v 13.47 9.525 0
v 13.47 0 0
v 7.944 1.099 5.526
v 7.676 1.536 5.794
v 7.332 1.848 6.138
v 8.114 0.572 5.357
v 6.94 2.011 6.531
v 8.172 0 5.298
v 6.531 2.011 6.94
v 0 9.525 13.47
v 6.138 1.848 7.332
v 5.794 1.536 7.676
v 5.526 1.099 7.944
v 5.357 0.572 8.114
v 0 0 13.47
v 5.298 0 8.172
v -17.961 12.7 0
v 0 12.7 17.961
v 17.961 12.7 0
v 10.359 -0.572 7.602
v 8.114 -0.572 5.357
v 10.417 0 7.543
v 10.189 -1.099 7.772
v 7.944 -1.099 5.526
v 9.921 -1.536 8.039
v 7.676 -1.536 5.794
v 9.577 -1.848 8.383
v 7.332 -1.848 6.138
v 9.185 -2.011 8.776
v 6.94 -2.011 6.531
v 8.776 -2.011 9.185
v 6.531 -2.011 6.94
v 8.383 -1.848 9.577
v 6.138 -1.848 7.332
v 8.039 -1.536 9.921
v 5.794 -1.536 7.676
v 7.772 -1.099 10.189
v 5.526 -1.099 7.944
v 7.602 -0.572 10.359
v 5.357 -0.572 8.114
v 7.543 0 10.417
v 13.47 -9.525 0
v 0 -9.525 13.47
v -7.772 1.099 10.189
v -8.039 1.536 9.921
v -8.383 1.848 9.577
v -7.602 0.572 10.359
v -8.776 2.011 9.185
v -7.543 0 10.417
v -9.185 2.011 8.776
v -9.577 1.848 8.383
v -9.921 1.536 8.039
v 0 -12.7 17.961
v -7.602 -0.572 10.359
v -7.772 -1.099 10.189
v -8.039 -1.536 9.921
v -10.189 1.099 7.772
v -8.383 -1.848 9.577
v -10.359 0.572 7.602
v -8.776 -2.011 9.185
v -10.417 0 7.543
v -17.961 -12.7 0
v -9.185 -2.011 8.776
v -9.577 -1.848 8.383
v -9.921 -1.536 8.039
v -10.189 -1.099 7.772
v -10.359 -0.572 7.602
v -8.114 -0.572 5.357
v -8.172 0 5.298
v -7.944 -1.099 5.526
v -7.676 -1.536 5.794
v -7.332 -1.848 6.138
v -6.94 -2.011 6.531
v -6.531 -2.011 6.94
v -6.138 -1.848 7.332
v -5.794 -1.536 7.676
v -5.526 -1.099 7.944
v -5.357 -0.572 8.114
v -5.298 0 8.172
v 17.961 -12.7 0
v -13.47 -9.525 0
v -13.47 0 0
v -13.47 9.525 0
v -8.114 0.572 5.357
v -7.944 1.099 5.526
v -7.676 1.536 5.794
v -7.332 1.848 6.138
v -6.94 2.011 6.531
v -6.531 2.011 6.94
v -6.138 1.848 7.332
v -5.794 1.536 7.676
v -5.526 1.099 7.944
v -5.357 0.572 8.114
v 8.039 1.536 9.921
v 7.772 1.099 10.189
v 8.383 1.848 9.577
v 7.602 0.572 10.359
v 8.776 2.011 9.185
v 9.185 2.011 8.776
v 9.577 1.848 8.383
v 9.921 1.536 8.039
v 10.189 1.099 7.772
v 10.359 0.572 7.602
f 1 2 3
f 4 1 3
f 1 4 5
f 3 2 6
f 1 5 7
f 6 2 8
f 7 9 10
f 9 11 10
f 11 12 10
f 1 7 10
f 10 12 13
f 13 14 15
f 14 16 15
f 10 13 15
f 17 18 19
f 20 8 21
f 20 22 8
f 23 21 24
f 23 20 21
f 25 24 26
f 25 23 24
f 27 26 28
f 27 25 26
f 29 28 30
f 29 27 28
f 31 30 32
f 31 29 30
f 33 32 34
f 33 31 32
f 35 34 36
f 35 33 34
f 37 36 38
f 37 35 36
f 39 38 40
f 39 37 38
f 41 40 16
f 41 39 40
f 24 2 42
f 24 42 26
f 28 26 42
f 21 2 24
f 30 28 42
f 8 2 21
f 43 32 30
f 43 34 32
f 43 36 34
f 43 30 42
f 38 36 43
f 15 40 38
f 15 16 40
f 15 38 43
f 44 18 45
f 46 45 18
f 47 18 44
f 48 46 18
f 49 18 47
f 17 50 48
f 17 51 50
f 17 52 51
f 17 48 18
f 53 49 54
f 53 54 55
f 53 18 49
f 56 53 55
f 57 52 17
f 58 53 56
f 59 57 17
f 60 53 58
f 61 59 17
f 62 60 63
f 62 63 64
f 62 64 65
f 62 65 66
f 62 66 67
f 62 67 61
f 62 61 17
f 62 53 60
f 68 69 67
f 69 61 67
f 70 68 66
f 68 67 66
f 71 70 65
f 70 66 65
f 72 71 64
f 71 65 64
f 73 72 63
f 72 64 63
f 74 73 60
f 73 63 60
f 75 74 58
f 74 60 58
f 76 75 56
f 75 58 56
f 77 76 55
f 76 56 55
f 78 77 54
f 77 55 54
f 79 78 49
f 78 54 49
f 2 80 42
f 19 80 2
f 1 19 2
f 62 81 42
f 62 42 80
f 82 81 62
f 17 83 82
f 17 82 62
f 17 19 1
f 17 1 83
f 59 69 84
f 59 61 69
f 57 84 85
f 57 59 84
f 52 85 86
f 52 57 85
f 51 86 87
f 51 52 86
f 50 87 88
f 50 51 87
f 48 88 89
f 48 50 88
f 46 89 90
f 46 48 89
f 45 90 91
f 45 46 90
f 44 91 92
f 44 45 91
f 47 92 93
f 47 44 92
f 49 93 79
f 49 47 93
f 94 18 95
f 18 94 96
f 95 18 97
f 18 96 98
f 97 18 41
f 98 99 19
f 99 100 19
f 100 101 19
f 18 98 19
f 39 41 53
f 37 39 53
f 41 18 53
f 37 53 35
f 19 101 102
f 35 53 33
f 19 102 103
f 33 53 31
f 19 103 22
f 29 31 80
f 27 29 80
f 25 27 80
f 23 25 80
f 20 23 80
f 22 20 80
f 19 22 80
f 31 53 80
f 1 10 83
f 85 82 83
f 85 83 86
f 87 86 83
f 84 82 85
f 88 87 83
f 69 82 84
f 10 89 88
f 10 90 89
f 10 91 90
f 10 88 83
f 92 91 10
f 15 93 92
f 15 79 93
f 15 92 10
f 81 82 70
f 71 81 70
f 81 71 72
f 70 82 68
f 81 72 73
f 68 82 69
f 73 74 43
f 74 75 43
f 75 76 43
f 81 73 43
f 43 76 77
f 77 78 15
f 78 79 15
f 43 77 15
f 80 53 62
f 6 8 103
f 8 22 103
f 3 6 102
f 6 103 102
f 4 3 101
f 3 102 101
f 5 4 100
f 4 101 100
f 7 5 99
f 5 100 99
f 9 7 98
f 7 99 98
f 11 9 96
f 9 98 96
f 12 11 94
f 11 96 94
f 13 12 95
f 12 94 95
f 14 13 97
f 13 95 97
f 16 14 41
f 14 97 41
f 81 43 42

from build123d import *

# Parameters (mm, degrees)
F1_DEPTH = 12.7
F3_DEPTH = 3.175
F4_R     = 2.032
F5_DEPTH = 12.701


with BuildPart() as f1:
    # F0 (on Front) → F1 (new body)
    with BuildSketch(Plane.XZ):
        Polygon((0, 13.4703841816), (0, 17.9605122421), (-17.9605122421, 0), (-13.4703841816, 0), align=None)
    extrude(amount=F1_DEPTH)

    # F2 (on face) → F3 (join)
    with BuildSketch(Plane.XZ.offset(12.7)):
        Polygon((0, 0), (0, 13.4703841816), (-13.4703841816, 0), align=None)
    extrude(amount=-F3_DEPTH)

    # F4 (on face) → F5 (cut, through all)
    with BuildSketch(Plane(origin=(-8.9802561211, 0, 8.9802561211), x_dir=(0, -1, 0), z_dir=(-0.7071067812, 0, 0.7071067812))):
        Circle(F4_R)
    extrude(amount=-F5_DEPTH, mode=Mode.SUBTRACT)

    # F6: F1 across face


with BuildPart() as f1_1:
    add(f1.part)
    add(f1.part.mirror(Plane(origin=(0, -8.3910714286, 11.8667670171), x_dir=(0, 1, 0), z_dir=(1, 0, 0))))

    # F7: F1 across face


with BuildPart() as f1_2:
    add(f1_1.part)
    add(f1_1.part.mirror(Plane(origin=(0, 0, 12.6031300765), x_dir=(-1, 0, 0), z_dir=(0, 1, 0))))


solid = f1_2.part
